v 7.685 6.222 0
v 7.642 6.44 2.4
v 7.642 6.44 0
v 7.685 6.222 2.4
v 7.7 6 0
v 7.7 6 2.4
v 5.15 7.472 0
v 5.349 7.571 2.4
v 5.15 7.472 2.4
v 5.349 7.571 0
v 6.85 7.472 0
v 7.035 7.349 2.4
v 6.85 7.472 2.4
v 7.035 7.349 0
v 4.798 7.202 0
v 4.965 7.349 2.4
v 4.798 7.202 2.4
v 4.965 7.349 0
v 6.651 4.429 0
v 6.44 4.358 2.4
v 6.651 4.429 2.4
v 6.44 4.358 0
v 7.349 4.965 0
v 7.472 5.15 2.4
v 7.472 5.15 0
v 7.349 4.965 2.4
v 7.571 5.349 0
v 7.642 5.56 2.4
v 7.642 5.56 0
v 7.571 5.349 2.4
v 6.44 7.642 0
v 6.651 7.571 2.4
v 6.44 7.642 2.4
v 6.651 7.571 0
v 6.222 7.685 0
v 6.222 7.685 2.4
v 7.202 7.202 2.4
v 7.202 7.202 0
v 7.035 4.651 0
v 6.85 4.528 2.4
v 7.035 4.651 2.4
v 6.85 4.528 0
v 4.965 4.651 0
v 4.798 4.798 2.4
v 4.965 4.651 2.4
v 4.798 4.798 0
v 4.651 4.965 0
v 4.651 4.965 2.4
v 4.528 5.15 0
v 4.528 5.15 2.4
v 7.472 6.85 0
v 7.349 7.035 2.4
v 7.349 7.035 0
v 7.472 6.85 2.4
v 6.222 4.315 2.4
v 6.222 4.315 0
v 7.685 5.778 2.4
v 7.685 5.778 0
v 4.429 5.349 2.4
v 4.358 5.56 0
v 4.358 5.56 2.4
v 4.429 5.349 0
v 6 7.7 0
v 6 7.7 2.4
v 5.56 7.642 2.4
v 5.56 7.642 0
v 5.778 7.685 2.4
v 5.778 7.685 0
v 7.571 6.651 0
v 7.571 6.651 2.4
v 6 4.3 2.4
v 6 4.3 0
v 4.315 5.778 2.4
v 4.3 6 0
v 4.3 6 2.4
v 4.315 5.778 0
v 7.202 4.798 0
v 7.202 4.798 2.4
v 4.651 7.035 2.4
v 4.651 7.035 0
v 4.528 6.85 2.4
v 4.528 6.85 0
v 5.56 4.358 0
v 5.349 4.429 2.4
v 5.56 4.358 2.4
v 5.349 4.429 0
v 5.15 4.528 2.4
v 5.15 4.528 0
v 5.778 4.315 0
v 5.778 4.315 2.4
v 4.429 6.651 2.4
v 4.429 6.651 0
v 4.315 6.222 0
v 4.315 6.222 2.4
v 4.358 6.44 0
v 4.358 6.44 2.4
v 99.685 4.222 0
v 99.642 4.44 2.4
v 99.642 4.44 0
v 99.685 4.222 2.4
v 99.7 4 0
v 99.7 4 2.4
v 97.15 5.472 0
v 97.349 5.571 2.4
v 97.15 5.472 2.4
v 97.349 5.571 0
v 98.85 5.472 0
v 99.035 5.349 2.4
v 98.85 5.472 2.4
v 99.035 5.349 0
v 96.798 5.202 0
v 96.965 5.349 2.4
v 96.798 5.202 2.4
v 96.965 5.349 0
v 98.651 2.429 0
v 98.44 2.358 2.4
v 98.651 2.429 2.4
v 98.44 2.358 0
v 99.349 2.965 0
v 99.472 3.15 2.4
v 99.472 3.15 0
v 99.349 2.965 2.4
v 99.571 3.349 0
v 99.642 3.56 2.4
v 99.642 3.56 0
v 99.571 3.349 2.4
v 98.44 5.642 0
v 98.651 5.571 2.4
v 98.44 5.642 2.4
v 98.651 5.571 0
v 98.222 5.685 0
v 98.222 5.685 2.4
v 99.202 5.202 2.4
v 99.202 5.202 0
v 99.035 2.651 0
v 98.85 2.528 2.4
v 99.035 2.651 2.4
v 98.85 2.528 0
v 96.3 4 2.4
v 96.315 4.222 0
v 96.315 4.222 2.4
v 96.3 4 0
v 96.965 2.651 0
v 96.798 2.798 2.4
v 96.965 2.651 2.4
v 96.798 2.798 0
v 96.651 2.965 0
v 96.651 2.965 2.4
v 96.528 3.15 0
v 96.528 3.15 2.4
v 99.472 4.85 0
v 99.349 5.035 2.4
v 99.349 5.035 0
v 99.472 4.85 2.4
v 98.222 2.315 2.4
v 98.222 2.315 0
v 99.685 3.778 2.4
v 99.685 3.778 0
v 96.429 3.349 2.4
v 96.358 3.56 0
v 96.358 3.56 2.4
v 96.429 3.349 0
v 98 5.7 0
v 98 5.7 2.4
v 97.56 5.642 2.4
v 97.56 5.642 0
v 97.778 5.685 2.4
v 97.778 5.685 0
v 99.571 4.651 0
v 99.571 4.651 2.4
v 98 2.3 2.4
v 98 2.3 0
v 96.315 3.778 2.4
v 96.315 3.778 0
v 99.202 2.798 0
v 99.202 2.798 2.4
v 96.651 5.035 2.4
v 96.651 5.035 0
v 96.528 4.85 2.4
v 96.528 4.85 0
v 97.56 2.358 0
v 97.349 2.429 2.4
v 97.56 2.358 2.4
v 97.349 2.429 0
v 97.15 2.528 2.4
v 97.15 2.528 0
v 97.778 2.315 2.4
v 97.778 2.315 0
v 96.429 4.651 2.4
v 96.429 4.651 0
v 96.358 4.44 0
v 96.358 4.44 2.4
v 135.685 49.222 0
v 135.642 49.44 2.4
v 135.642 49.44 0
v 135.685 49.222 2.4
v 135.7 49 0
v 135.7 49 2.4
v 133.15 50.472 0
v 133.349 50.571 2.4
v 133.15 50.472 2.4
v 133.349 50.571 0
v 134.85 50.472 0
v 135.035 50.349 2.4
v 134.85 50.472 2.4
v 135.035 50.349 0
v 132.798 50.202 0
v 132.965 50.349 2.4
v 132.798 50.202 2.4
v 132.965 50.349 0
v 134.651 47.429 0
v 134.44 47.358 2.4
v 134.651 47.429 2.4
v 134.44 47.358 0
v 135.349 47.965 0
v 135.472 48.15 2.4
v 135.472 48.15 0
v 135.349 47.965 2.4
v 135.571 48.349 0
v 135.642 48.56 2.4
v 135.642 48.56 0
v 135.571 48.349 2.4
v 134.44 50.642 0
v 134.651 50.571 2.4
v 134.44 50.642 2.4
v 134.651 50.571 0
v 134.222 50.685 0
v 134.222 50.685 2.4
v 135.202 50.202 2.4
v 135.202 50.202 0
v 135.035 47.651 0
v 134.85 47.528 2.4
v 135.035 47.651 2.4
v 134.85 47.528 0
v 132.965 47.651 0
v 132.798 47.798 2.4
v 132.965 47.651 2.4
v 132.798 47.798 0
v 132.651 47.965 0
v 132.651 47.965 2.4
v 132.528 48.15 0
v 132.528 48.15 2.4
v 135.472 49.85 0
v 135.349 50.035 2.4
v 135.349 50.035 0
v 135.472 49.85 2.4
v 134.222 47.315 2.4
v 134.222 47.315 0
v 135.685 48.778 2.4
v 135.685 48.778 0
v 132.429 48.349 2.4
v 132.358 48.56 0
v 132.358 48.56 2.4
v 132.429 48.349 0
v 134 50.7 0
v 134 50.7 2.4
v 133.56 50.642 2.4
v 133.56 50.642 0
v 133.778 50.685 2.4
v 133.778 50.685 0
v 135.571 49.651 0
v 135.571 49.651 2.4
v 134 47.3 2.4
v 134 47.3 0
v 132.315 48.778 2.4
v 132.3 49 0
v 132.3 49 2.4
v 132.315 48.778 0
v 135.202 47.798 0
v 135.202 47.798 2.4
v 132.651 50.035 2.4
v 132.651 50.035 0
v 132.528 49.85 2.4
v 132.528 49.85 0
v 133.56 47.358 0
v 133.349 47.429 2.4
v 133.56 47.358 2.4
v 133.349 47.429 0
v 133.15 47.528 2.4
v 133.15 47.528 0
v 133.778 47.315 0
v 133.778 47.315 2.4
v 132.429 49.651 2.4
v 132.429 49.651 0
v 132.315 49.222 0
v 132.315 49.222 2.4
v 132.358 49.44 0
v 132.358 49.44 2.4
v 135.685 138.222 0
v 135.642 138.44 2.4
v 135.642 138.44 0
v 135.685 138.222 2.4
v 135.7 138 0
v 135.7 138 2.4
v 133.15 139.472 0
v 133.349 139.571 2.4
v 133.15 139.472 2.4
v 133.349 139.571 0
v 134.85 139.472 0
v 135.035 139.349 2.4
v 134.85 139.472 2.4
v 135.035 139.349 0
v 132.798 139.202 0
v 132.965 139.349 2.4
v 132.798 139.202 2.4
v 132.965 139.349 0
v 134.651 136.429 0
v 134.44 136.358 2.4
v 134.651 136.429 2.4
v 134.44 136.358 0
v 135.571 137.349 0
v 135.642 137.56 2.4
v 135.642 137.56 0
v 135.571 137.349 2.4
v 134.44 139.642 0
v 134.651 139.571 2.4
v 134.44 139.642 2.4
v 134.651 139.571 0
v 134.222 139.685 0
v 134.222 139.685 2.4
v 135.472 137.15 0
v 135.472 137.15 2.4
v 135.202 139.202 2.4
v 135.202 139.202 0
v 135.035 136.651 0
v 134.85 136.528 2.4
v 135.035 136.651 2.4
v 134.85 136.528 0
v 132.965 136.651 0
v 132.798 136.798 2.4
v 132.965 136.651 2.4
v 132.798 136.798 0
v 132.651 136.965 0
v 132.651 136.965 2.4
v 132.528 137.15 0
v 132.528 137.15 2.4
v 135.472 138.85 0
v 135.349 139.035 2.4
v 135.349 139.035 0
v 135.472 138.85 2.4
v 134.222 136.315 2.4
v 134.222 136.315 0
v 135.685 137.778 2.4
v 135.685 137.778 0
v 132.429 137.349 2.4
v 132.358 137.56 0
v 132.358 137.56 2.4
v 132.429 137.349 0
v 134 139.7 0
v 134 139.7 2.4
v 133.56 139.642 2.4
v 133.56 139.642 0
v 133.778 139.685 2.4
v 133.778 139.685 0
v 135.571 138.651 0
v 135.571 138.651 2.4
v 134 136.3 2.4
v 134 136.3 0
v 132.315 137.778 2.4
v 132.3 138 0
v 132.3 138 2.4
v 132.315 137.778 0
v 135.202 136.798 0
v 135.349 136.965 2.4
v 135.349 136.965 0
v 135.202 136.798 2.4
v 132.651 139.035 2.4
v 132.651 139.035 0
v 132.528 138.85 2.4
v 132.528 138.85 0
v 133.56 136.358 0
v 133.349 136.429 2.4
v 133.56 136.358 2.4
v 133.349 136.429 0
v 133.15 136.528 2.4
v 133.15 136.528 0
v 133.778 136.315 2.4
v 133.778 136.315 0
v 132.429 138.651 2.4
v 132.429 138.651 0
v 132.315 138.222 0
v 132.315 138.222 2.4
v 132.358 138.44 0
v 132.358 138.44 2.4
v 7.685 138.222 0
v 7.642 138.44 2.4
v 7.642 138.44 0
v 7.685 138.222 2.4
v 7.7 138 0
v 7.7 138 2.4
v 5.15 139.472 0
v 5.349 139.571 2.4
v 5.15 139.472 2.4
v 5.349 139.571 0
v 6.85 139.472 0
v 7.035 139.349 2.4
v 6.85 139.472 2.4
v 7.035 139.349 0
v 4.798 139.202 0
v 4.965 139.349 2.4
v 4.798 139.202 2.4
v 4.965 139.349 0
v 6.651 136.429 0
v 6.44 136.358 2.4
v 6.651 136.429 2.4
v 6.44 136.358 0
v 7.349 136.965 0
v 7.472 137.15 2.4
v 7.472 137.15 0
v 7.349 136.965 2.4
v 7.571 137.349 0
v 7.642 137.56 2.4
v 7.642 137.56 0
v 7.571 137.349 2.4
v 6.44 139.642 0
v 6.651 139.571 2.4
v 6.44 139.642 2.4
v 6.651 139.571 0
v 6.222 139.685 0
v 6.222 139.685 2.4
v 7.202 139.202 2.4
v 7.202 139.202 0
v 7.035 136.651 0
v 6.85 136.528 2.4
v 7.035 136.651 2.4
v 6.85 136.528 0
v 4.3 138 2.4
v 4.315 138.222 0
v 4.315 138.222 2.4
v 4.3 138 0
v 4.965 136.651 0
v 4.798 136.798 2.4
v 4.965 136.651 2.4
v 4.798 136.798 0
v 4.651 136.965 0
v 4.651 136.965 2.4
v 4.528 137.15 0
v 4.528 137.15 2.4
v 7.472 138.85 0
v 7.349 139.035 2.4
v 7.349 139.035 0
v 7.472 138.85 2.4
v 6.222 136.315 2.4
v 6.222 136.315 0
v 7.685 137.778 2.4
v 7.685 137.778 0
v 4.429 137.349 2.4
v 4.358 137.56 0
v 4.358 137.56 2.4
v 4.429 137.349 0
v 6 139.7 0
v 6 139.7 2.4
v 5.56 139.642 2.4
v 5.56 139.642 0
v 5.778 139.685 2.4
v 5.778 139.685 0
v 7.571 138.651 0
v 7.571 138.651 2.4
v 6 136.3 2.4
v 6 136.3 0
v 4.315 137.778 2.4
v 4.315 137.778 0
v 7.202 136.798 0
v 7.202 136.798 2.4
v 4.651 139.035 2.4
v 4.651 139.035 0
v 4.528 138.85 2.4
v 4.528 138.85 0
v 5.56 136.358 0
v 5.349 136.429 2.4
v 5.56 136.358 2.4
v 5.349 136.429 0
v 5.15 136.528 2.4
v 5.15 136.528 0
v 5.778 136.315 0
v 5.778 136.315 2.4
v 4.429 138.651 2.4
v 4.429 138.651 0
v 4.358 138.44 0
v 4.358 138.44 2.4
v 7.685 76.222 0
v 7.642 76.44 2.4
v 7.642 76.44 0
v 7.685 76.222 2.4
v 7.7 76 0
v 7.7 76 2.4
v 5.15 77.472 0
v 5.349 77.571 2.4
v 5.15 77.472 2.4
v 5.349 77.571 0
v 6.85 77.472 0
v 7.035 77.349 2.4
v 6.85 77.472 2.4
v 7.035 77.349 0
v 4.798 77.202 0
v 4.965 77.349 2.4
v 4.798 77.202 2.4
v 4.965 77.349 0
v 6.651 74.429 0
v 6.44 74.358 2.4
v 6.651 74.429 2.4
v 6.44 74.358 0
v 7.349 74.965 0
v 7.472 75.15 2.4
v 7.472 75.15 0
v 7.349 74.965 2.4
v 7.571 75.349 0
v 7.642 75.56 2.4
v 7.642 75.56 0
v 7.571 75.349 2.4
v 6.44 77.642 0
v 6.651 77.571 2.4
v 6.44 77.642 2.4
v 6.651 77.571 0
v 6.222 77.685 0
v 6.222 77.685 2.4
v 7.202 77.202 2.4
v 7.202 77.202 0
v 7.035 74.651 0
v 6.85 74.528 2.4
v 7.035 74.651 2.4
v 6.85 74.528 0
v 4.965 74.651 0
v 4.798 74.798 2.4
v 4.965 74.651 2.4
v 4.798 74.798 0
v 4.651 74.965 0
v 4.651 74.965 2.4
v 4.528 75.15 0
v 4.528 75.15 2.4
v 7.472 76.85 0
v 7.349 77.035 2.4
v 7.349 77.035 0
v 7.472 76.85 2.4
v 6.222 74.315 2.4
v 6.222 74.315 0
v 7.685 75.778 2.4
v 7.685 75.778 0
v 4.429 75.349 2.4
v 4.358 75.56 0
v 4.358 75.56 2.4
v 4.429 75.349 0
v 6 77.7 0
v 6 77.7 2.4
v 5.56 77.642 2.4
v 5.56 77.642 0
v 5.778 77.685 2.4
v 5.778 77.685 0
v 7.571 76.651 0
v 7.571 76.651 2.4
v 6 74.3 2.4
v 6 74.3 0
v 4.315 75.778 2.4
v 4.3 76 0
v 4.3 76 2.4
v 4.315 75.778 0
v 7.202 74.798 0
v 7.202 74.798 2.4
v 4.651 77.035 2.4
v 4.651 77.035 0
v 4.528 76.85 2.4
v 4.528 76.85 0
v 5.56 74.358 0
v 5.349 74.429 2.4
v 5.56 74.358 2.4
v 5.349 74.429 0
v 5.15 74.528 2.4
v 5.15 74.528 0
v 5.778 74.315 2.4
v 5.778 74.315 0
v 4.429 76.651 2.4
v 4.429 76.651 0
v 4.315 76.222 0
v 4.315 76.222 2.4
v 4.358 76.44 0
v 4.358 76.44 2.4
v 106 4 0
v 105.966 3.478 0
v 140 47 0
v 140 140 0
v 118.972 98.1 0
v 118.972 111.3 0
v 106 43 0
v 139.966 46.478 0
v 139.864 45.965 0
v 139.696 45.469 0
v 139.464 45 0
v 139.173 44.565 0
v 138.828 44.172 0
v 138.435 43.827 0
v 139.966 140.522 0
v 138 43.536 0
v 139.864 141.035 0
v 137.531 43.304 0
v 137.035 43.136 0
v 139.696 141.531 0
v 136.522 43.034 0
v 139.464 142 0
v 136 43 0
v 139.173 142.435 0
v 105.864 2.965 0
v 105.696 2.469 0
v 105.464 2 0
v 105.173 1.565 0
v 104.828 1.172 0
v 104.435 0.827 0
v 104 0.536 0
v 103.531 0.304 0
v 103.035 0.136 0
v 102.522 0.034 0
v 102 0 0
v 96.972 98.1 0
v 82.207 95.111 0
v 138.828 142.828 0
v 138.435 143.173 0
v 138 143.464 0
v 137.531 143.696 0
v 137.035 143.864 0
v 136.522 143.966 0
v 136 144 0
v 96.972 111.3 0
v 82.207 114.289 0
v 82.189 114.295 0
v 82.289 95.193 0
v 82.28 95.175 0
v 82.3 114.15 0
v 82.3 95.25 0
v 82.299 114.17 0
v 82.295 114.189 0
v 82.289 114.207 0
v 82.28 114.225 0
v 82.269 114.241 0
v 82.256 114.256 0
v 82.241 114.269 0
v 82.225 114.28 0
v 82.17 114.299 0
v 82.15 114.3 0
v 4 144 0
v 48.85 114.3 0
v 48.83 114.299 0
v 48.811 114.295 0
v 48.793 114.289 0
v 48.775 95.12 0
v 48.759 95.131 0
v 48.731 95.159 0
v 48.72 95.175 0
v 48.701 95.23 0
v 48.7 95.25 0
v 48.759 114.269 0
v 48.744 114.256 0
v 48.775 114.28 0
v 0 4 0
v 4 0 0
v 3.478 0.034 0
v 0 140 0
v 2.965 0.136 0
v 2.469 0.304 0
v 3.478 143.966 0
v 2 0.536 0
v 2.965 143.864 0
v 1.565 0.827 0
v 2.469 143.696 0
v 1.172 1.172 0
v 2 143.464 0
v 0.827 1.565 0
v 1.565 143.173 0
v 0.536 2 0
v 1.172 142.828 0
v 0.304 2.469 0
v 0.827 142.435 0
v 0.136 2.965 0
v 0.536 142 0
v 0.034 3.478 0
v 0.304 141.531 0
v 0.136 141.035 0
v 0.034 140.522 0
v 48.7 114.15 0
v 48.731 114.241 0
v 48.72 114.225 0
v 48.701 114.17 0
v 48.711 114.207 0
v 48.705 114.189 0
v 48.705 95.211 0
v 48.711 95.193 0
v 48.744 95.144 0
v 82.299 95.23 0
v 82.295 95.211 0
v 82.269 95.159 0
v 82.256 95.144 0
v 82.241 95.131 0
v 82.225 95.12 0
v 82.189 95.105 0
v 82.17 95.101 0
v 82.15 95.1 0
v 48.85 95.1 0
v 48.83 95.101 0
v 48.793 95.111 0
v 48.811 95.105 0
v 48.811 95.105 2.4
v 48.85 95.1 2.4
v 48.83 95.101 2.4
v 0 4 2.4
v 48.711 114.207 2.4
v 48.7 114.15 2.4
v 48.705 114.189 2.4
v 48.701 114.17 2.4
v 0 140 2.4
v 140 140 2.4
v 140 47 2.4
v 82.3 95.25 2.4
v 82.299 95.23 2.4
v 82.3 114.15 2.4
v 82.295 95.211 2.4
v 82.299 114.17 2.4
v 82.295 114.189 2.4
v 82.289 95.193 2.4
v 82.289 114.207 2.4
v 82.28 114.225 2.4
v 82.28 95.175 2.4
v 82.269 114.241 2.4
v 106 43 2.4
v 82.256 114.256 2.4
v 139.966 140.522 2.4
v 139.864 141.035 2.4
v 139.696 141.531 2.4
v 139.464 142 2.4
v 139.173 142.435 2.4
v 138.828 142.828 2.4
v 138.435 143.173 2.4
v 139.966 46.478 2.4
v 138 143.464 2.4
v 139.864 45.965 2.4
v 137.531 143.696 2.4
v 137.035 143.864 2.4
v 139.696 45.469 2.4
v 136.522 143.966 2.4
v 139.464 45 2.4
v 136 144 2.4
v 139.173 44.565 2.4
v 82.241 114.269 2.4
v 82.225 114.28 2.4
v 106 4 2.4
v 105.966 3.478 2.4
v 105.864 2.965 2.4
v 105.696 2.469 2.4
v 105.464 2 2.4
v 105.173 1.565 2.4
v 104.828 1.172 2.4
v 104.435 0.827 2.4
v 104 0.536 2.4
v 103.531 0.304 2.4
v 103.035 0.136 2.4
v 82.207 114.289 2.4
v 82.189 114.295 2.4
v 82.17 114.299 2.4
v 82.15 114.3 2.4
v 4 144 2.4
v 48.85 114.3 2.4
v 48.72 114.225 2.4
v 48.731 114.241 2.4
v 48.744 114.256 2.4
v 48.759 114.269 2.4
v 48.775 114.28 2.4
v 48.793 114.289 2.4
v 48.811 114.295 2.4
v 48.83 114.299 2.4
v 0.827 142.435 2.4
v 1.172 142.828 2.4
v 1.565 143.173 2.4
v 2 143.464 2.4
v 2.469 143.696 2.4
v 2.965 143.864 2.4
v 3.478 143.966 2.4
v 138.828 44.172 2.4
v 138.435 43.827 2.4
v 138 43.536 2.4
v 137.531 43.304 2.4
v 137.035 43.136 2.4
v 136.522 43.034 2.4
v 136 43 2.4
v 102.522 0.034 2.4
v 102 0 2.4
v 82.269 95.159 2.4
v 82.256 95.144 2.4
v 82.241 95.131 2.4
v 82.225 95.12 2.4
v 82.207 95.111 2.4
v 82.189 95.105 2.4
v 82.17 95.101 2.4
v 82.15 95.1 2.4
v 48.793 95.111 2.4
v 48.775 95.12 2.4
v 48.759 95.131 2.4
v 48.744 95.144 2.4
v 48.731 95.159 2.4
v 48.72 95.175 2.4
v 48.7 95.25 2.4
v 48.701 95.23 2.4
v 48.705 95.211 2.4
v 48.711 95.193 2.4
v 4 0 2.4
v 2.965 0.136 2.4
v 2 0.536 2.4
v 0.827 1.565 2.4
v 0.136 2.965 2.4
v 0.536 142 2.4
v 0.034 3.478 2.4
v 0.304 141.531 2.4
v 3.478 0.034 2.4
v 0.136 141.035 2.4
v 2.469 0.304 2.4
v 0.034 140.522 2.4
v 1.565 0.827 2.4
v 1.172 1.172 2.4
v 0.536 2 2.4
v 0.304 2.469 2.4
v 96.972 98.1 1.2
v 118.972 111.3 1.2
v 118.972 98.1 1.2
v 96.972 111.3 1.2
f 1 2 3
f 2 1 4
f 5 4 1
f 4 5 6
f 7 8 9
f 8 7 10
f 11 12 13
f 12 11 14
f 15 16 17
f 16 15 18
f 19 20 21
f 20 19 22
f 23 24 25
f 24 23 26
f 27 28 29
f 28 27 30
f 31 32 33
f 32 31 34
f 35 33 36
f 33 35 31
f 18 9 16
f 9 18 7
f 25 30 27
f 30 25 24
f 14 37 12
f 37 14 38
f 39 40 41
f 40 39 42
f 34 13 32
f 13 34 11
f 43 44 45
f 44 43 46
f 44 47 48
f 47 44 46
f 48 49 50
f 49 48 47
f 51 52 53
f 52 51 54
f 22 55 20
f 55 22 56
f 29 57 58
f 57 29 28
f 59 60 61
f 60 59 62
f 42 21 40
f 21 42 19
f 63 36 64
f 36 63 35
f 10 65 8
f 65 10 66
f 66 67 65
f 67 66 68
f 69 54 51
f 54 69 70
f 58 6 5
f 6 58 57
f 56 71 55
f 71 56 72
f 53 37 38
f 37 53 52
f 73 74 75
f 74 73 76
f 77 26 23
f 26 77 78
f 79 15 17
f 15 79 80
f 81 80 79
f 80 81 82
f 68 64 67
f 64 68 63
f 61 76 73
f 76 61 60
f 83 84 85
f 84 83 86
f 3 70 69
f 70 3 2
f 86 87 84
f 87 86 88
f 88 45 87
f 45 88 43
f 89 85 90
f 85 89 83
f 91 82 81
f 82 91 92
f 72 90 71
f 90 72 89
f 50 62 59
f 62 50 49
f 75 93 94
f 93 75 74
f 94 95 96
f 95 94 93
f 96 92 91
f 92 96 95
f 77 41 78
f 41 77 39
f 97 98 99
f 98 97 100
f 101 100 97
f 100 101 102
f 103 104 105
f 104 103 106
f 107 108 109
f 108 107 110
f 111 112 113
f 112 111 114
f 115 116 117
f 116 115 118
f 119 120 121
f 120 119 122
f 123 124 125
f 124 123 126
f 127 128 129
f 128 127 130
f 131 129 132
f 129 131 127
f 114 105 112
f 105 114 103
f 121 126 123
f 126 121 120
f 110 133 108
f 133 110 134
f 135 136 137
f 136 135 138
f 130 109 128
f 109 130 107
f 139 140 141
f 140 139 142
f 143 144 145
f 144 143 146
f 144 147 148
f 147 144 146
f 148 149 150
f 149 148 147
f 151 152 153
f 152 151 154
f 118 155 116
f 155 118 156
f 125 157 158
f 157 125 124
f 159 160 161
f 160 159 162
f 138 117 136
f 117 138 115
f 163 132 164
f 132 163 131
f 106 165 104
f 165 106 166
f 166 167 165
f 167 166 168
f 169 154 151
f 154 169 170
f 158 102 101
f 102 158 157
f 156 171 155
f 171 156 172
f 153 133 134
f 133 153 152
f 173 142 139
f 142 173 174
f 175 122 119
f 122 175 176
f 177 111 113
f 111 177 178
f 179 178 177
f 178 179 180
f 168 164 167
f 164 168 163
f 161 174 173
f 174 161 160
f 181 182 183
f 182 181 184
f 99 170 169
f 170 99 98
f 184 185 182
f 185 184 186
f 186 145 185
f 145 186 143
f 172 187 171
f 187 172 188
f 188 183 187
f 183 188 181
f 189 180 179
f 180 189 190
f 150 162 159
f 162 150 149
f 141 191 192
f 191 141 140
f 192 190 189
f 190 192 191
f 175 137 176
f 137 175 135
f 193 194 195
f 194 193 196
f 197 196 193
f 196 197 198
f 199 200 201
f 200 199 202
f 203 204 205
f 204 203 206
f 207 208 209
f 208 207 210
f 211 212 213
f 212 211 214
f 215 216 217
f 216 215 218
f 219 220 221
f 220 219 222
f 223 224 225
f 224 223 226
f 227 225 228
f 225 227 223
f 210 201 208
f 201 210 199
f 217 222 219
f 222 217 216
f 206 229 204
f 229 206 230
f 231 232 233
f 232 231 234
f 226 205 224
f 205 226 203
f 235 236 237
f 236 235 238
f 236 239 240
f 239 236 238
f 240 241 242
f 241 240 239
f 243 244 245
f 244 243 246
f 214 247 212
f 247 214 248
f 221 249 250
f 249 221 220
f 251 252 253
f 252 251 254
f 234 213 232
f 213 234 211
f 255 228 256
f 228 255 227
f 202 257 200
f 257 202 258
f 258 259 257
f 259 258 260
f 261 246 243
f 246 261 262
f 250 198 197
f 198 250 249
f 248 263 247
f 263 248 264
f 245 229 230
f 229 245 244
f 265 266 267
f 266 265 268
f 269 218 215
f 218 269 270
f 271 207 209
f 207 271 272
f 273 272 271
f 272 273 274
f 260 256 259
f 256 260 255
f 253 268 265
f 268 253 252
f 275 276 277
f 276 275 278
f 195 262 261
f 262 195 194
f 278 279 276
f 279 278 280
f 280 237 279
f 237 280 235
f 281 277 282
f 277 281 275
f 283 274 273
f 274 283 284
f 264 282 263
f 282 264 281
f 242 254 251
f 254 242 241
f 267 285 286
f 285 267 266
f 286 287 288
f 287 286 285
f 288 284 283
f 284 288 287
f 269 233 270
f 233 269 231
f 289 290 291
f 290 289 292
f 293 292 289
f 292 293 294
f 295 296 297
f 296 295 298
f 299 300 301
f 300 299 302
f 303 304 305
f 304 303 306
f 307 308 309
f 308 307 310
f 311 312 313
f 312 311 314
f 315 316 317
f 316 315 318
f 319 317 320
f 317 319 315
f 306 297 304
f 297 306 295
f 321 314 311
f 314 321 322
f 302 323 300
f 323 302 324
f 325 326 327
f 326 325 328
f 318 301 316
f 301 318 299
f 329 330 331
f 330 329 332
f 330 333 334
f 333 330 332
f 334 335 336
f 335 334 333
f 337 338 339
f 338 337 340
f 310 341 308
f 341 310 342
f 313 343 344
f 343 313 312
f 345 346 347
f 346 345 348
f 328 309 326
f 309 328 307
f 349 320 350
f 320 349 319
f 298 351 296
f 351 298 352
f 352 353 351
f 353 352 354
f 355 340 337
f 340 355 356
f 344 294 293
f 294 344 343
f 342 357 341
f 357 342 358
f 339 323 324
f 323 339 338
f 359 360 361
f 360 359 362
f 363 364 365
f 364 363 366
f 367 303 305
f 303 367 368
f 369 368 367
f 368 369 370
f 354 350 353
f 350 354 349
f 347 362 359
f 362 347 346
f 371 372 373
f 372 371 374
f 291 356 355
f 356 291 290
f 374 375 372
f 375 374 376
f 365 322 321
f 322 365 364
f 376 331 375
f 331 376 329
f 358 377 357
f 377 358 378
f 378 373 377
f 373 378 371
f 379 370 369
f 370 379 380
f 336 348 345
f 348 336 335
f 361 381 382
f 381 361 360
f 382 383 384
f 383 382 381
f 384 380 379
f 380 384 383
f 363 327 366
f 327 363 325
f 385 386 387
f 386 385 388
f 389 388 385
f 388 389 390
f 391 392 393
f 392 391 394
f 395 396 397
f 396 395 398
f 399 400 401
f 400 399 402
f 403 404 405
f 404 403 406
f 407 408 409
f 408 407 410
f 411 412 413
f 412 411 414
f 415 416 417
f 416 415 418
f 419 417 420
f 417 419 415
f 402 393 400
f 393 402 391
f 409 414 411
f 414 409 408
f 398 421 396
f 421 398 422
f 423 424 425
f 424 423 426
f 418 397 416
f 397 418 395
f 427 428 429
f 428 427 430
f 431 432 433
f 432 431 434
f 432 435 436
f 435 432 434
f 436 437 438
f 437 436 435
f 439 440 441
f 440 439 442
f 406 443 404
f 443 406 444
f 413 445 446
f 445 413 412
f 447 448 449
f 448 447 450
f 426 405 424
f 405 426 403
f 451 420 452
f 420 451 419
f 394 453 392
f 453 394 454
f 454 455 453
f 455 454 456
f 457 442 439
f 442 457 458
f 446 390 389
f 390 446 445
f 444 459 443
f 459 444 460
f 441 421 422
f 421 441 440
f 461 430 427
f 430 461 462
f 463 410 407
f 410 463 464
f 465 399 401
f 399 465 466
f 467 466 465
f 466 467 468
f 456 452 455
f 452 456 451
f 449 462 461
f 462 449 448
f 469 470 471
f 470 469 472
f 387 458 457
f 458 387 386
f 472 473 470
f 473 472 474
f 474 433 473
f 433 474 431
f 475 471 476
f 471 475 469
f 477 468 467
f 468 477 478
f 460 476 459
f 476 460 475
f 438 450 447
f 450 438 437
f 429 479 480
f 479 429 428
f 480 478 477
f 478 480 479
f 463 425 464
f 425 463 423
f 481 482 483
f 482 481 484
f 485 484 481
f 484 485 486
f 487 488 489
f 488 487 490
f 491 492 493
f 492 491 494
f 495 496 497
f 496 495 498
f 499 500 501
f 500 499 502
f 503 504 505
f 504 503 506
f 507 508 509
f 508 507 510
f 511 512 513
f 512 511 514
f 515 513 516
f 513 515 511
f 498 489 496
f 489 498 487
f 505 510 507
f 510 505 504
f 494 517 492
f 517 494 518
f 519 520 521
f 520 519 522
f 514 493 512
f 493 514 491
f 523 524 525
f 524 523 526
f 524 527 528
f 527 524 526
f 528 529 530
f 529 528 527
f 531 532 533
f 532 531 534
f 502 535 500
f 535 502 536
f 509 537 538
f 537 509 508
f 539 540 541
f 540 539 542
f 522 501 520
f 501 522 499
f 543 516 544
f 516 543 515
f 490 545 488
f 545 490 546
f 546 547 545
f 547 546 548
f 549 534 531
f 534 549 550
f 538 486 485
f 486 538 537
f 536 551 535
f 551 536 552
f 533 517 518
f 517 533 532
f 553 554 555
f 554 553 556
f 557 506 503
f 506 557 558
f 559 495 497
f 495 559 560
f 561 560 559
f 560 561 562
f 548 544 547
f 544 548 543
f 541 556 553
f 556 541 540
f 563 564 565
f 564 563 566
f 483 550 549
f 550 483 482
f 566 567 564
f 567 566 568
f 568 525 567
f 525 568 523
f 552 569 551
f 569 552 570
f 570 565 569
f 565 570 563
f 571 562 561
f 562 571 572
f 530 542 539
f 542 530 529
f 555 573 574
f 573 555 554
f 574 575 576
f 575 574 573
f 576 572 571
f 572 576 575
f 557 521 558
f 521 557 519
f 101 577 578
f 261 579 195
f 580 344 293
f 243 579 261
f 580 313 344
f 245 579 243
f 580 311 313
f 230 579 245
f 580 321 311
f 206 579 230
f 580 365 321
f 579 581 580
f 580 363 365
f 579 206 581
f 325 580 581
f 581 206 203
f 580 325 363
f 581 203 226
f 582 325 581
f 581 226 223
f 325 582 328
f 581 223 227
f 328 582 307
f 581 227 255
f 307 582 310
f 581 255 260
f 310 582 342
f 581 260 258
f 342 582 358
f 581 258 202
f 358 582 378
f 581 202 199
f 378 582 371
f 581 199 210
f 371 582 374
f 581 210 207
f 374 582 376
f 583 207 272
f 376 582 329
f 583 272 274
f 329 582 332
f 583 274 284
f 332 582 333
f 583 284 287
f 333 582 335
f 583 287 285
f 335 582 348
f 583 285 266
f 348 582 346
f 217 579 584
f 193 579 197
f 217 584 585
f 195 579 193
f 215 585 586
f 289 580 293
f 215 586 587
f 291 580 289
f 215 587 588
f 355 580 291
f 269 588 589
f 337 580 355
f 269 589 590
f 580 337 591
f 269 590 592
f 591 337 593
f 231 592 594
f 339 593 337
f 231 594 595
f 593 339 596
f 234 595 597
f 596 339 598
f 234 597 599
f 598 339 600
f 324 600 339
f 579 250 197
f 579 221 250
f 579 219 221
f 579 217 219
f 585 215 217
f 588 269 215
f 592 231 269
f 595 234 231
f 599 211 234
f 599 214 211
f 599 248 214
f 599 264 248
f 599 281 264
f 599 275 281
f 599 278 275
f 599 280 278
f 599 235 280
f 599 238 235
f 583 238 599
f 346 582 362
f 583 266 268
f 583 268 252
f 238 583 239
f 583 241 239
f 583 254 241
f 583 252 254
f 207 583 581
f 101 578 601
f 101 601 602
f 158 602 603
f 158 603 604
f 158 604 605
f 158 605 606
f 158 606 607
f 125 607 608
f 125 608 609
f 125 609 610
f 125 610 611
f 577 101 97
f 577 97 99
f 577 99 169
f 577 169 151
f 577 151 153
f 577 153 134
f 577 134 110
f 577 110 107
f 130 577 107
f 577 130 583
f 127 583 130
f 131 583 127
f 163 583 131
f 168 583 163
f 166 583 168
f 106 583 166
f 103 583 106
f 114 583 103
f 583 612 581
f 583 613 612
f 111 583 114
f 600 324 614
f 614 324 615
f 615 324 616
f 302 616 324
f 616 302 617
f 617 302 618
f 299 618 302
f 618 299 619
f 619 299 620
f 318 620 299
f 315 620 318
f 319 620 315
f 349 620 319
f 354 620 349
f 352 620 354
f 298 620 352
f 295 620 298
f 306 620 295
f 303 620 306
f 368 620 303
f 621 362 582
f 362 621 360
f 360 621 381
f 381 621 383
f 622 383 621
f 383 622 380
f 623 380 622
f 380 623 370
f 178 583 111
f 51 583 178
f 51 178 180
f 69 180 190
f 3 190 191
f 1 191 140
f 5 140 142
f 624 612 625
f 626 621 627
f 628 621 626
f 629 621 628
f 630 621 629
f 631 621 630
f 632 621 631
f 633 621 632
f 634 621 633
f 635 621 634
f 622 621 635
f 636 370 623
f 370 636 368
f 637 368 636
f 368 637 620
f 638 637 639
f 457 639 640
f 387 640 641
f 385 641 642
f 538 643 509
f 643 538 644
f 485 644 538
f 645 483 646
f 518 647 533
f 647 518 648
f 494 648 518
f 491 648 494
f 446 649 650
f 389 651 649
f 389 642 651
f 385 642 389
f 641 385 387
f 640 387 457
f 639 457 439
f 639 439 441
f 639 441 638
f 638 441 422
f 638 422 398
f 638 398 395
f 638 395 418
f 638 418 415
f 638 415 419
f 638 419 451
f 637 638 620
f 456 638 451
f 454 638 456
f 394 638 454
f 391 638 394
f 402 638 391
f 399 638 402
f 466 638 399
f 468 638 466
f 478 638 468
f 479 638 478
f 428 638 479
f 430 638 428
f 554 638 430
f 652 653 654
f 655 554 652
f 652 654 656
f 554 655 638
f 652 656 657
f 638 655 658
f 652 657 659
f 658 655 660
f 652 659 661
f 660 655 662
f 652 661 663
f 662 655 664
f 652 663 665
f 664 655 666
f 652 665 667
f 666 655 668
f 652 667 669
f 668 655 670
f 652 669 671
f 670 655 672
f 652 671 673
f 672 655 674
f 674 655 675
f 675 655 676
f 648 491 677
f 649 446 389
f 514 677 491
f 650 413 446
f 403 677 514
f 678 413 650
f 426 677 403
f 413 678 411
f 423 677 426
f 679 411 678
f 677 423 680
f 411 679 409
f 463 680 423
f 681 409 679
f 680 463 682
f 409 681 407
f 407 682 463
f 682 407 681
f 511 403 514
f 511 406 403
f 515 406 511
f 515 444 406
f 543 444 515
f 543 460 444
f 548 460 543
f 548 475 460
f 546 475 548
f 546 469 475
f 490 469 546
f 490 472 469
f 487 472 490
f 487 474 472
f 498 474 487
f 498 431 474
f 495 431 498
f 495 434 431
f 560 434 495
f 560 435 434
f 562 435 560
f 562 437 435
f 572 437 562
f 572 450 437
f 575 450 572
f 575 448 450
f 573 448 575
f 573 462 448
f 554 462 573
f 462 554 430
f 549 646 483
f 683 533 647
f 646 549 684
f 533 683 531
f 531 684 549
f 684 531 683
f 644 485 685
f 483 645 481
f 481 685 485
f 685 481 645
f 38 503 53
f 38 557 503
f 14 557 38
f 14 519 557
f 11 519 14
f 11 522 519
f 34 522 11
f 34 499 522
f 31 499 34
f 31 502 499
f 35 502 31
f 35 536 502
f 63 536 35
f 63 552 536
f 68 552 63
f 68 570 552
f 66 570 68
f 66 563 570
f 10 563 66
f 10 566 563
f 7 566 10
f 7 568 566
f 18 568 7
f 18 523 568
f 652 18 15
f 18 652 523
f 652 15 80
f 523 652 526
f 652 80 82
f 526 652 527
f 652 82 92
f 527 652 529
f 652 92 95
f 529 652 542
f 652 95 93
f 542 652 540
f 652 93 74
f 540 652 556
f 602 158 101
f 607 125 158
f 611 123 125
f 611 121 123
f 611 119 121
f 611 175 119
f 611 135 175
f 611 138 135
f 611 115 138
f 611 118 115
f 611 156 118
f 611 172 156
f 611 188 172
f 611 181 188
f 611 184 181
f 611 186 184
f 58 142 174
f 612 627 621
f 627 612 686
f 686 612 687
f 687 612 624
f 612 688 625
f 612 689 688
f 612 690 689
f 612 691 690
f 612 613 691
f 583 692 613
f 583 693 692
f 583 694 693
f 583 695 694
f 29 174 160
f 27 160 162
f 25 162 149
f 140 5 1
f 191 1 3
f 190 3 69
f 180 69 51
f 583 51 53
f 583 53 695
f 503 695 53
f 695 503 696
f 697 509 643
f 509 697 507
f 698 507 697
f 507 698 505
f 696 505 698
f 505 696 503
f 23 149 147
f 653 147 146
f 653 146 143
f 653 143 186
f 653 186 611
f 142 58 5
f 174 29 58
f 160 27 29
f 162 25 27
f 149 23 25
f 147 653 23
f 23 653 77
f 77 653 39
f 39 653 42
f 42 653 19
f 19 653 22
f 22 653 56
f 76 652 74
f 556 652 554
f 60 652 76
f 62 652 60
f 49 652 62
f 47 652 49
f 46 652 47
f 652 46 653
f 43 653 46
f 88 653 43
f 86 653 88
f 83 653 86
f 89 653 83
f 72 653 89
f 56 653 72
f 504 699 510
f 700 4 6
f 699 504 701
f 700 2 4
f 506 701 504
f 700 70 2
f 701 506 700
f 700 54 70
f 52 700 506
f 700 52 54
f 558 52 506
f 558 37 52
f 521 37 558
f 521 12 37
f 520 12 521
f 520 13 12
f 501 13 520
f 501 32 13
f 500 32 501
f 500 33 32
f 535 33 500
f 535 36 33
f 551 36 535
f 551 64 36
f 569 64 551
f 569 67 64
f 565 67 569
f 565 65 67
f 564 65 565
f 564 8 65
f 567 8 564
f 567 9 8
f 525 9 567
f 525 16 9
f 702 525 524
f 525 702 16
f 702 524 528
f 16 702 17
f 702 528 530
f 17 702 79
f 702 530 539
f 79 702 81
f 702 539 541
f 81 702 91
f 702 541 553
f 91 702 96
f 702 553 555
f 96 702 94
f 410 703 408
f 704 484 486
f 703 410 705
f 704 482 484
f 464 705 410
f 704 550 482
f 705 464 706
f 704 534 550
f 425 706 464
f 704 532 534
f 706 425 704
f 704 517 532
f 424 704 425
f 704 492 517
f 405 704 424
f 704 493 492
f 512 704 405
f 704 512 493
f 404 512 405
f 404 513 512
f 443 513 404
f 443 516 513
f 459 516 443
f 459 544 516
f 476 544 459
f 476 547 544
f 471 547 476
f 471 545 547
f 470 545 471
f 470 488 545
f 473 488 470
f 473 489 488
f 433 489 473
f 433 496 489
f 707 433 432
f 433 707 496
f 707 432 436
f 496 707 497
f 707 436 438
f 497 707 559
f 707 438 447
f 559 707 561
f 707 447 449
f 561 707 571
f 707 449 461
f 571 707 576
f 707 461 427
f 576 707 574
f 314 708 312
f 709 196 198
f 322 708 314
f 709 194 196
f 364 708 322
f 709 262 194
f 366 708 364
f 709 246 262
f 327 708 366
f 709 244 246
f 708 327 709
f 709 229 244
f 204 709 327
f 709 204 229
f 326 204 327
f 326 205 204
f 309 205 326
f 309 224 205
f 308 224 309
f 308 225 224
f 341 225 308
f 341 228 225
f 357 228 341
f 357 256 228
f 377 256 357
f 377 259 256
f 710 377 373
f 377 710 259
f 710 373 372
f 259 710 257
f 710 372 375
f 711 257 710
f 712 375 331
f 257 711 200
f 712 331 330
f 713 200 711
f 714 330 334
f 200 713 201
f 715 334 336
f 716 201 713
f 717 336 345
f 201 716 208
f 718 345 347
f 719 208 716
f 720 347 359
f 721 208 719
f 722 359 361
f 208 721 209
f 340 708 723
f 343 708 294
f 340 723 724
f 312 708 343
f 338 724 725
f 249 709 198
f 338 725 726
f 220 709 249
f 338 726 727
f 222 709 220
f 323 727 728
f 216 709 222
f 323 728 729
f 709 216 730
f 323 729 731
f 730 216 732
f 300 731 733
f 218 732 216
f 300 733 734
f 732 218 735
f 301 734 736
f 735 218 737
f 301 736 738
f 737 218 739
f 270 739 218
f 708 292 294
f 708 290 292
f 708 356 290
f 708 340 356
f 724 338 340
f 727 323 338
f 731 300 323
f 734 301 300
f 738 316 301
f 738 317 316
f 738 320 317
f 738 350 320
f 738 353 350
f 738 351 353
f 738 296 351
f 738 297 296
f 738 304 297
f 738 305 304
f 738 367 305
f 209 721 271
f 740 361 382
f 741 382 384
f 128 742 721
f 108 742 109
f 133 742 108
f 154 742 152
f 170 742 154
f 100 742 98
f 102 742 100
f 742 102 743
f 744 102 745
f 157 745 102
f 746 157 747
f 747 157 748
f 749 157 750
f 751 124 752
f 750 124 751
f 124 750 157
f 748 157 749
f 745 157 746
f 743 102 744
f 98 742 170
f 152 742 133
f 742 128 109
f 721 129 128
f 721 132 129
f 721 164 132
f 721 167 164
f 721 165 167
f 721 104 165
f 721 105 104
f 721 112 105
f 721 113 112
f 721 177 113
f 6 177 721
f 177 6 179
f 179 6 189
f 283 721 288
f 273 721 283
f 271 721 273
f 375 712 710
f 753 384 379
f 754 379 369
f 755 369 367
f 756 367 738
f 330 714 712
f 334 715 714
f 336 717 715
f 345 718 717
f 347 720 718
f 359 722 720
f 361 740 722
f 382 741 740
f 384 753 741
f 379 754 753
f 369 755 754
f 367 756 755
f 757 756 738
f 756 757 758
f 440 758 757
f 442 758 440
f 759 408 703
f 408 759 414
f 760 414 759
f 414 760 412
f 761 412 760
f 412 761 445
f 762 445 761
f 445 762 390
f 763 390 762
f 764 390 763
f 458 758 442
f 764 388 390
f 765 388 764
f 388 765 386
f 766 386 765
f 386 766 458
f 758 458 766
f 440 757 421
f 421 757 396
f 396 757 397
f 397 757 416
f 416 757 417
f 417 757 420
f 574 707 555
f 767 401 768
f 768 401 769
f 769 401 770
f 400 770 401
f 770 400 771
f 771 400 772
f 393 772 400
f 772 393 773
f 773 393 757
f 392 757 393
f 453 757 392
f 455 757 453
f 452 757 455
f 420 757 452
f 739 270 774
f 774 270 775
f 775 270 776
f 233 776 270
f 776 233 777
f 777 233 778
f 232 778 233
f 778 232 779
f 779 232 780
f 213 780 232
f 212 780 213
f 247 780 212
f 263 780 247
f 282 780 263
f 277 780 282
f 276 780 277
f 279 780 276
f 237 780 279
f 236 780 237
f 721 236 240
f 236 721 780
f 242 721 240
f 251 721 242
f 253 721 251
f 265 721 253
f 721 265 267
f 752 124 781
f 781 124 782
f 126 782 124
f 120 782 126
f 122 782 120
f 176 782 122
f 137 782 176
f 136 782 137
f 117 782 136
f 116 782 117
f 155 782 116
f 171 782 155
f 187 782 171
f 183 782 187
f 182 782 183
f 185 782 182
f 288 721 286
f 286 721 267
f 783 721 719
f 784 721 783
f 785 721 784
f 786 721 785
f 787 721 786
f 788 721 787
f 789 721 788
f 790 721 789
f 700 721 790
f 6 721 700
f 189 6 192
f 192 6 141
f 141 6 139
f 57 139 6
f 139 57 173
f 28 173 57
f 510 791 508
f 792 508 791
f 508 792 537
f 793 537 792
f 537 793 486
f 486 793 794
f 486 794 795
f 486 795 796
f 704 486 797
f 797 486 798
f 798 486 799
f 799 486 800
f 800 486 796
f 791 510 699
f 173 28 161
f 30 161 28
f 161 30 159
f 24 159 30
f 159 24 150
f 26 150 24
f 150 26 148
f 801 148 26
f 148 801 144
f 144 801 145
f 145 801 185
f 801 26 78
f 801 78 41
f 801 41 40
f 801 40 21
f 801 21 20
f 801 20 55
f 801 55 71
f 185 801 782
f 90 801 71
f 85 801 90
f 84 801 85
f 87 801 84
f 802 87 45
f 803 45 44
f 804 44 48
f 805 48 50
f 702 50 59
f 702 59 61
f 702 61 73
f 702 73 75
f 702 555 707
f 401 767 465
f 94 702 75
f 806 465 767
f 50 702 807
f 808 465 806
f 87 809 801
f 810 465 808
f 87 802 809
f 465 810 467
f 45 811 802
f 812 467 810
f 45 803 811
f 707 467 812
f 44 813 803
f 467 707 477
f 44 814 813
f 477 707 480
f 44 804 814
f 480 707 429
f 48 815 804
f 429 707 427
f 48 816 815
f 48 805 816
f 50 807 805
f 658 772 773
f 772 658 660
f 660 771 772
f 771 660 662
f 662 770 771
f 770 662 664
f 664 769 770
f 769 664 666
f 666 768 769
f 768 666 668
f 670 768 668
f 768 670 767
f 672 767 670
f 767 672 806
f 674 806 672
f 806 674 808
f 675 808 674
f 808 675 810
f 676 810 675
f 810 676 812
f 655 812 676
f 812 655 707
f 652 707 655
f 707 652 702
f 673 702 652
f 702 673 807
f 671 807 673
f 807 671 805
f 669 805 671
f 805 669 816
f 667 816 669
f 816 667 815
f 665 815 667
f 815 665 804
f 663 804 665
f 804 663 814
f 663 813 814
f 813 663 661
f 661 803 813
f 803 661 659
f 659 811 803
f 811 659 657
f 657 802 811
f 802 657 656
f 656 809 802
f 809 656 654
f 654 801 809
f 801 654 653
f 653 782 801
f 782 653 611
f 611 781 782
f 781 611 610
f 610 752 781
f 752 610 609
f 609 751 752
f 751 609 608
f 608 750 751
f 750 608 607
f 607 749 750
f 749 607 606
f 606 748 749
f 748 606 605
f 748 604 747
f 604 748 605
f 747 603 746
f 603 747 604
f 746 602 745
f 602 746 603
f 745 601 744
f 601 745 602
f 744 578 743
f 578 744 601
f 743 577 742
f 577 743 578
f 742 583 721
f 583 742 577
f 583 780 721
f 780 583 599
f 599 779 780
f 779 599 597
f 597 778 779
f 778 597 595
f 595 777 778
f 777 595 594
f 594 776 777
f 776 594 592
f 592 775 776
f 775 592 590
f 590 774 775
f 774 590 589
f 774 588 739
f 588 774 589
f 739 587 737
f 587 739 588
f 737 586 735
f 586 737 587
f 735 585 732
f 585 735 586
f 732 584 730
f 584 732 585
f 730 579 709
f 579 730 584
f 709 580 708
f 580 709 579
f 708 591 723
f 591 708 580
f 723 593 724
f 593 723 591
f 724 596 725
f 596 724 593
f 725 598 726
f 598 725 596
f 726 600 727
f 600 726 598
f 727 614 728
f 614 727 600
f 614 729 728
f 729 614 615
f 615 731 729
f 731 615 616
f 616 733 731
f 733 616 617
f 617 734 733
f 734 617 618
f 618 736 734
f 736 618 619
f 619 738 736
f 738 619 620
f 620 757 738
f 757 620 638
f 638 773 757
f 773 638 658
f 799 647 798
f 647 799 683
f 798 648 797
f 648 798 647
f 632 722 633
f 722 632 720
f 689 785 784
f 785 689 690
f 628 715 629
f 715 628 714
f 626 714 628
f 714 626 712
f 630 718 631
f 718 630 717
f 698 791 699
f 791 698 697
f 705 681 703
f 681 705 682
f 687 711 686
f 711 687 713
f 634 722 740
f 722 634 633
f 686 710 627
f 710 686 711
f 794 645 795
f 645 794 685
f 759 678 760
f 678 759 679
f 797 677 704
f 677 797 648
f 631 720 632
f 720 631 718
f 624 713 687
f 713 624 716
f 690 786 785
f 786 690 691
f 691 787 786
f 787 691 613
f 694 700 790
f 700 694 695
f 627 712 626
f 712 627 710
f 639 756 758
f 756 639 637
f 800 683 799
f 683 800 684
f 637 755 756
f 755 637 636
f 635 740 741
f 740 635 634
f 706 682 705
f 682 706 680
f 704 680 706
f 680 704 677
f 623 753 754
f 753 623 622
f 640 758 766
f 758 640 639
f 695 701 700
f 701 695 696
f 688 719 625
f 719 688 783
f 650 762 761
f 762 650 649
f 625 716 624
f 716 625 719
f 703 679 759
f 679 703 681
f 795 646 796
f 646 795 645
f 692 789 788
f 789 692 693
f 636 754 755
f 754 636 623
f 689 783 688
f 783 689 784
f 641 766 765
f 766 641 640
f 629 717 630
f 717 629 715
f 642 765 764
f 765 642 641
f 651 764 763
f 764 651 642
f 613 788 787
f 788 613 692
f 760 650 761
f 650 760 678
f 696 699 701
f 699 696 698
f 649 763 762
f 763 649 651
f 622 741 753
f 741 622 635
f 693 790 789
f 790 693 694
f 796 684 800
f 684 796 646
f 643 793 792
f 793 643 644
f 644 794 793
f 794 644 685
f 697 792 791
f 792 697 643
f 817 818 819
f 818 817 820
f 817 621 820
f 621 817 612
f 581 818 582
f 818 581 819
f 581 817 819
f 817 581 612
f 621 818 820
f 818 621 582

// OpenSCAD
// Plain alternative: same screen opening, fasteners and underside USB relief.
// Override the shared design's existing logo switch; keep its fit unchanged.
include <router_heltec_case.scad>
part = "lid";
lid_logo = false;
